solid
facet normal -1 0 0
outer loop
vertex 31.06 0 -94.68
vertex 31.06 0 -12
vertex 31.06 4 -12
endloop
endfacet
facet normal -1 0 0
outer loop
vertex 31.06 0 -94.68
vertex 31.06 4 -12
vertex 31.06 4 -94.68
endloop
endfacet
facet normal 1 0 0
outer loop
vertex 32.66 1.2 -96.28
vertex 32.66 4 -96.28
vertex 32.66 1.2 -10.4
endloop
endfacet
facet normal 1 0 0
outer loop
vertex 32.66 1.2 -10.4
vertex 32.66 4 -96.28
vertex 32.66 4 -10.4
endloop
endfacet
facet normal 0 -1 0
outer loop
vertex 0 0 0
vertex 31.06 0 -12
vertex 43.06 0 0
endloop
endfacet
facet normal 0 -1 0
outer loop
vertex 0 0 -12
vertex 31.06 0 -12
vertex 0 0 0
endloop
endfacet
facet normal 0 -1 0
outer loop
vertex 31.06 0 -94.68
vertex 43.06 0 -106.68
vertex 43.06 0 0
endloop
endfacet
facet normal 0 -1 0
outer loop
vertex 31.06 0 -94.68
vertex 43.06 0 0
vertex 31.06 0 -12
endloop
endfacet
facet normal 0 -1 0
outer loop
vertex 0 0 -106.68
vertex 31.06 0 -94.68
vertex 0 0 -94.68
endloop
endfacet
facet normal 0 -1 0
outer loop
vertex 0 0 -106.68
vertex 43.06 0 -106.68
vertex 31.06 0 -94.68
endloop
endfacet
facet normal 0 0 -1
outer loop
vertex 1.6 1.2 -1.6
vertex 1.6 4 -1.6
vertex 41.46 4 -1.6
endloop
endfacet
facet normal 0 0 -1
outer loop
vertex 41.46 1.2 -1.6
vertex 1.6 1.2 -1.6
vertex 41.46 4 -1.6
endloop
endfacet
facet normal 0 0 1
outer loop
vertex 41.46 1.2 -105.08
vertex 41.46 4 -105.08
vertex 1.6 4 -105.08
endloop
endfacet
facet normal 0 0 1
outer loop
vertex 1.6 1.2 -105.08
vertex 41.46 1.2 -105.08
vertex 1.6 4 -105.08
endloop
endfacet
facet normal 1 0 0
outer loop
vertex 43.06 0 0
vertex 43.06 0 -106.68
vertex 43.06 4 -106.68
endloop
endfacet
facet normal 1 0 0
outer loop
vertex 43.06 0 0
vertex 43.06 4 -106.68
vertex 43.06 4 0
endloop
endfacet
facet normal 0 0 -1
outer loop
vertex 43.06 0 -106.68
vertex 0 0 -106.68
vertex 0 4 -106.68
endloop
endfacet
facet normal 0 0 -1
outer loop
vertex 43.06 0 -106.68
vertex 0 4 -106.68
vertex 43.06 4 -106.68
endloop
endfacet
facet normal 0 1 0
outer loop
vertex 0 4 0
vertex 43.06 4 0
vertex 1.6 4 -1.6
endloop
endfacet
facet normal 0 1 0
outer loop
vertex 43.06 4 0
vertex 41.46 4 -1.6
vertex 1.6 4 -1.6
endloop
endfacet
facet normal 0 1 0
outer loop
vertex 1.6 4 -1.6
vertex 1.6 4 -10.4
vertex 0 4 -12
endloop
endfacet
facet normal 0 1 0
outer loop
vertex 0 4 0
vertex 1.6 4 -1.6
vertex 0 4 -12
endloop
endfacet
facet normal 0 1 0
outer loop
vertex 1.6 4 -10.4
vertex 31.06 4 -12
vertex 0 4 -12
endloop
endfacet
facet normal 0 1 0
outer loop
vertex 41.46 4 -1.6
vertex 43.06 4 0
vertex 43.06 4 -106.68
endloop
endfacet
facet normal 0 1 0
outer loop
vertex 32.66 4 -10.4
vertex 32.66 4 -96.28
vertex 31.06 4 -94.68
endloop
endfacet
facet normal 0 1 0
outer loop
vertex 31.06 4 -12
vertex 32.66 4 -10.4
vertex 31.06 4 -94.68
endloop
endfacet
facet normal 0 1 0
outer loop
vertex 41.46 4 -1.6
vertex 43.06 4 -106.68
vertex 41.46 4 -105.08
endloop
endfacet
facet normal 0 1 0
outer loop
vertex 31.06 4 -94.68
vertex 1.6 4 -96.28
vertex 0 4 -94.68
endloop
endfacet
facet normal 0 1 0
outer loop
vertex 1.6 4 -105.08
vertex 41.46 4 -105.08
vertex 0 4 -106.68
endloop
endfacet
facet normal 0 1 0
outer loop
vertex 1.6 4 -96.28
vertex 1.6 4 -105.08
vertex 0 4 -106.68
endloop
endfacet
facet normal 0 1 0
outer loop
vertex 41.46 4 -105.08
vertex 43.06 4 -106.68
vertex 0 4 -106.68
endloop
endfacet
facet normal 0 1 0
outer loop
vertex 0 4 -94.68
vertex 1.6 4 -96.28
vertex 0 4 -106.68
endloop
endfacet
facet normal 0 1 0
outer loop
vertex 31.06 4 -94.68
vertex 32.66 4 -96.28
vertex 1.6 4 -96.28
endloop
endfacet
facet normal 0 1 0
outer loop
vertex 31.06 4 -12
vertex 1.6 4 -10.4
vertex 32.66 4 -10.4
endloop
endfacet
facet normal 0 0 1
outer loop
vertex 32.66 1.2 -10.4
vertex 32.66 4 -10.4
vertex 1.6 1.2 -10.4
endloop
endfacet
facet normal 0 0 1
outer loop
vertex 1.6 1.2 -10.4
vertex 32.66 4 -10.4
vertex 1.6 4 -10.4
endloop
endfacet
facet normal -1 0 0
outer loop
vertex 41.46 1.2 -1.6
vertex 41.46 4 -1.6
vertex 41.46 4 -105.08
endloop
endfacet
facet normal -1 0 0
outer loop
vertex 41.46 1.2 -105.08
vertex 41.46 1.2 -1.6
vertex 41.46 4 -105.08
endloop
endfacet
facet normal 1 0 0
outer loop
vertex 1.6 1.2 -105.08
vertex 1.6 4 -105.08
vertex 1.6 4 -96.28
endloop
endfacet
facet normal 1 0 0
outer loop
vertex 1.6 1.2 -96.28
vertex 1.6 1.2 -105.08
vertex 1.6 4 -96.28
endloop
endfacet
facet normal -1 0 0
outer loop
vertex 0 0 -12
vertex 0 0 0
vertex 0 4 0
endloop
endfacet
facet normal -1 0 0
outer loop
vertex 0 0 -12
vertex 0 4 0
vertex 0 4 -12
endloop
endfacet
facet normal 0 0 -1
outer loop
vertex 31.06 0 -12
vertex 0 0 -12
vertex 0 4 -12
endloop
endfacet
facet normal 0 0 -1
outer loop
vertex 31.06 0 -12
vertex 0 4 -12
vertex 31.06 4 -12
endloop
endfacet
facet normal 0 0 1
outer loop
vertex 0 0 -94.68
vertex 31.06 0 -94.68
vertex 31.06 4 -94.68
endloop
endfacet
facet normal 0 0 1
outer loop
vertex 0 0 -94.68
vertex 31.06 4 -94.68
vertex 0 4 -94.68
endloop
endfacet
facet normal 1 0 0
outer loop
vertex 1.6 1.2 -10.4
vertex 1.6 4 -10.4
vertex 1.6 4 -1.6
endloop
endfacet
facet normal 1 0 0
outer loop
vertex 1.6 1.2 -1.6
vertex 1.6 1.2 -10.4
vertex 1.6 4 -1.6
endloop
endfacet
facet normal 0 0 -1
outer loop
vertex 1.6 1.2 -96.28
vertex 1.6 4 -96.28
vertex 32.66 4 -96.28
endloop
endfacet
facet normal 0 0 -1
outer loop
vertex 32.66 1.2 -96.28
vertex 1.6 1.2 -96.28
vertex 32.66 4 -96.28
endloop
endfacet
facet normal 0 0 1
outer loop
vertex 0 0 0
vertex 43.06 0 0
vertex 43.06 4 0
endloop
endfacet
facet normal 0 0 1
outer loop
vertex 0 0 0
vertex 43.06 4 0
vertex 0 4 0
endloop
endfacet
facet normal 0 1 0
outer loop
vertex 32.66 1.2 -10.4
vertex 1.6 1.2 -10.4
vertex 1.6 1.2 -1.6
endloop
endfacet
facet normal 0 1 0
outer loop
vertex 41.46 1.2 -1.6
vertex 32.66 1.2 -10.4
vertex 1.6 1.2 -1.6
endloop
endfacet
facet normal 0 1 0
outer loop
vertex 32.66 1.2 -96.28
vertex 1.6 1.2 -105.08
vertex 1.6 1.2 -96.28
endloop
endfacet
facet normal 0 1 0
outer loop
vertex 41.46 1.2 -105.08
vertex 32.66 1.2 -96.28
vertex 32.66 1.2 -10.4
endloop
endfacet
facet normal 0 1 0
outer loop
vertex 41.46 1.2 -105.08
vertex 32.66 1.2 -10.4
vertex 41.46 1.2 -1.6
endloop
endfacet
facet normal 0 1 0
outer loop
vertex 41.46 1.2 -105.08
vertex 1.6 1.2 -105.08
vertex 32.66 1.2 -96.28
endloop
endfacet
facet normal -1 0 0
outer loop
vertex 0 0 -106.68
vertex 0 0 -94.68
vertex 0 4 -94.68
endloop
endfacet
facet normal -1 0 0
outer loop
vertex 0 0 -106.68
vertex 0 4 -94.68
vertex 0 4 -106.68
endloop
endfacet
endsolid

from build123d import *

# Parameters (mm, degrees)
BOSS_EXTRUDE1_DEPTH = 4
CUT_EXTRUDE1_DEPTH  = 2.8


with BuildPart() as part:
    # Sketch1 → Boss-Extrude1 (new body)
    with BuildSketch(Plane(origin=(0, 0, 0), x_dir=(1, 0, 0), z_dir=(0, 1, 0))):
        Polygon((0, 106.68), (43.06, 106.68), (43.06, 0), (0, 0), (0, 12), (31.06, 12), (31.06, 94.68), (0, 94.68), align=None)
    extrude(amount=BOSS_EXTRUDE1_DEPTH)

    # Sketch2 → Cut-Extrude1 (cut)
    with BuildSketch(Plane(origin=(0, 4, 0), x_dir=(1, 0, 0), z_dir=(0, 1, 0))):
        Polygon((1.6, 105.08), (1.6, 96.28), (32.66, 96.28), (32.66, 10.4), (1.6, 10.4), (1.6, 1.6), (41.46, 1.6), (41.46, 105.08), align=None)
    extrude(amount=-CUT_EXTRUDE1_DEPTH, mode=Mode.SUBTRACT)


solid = part.part
